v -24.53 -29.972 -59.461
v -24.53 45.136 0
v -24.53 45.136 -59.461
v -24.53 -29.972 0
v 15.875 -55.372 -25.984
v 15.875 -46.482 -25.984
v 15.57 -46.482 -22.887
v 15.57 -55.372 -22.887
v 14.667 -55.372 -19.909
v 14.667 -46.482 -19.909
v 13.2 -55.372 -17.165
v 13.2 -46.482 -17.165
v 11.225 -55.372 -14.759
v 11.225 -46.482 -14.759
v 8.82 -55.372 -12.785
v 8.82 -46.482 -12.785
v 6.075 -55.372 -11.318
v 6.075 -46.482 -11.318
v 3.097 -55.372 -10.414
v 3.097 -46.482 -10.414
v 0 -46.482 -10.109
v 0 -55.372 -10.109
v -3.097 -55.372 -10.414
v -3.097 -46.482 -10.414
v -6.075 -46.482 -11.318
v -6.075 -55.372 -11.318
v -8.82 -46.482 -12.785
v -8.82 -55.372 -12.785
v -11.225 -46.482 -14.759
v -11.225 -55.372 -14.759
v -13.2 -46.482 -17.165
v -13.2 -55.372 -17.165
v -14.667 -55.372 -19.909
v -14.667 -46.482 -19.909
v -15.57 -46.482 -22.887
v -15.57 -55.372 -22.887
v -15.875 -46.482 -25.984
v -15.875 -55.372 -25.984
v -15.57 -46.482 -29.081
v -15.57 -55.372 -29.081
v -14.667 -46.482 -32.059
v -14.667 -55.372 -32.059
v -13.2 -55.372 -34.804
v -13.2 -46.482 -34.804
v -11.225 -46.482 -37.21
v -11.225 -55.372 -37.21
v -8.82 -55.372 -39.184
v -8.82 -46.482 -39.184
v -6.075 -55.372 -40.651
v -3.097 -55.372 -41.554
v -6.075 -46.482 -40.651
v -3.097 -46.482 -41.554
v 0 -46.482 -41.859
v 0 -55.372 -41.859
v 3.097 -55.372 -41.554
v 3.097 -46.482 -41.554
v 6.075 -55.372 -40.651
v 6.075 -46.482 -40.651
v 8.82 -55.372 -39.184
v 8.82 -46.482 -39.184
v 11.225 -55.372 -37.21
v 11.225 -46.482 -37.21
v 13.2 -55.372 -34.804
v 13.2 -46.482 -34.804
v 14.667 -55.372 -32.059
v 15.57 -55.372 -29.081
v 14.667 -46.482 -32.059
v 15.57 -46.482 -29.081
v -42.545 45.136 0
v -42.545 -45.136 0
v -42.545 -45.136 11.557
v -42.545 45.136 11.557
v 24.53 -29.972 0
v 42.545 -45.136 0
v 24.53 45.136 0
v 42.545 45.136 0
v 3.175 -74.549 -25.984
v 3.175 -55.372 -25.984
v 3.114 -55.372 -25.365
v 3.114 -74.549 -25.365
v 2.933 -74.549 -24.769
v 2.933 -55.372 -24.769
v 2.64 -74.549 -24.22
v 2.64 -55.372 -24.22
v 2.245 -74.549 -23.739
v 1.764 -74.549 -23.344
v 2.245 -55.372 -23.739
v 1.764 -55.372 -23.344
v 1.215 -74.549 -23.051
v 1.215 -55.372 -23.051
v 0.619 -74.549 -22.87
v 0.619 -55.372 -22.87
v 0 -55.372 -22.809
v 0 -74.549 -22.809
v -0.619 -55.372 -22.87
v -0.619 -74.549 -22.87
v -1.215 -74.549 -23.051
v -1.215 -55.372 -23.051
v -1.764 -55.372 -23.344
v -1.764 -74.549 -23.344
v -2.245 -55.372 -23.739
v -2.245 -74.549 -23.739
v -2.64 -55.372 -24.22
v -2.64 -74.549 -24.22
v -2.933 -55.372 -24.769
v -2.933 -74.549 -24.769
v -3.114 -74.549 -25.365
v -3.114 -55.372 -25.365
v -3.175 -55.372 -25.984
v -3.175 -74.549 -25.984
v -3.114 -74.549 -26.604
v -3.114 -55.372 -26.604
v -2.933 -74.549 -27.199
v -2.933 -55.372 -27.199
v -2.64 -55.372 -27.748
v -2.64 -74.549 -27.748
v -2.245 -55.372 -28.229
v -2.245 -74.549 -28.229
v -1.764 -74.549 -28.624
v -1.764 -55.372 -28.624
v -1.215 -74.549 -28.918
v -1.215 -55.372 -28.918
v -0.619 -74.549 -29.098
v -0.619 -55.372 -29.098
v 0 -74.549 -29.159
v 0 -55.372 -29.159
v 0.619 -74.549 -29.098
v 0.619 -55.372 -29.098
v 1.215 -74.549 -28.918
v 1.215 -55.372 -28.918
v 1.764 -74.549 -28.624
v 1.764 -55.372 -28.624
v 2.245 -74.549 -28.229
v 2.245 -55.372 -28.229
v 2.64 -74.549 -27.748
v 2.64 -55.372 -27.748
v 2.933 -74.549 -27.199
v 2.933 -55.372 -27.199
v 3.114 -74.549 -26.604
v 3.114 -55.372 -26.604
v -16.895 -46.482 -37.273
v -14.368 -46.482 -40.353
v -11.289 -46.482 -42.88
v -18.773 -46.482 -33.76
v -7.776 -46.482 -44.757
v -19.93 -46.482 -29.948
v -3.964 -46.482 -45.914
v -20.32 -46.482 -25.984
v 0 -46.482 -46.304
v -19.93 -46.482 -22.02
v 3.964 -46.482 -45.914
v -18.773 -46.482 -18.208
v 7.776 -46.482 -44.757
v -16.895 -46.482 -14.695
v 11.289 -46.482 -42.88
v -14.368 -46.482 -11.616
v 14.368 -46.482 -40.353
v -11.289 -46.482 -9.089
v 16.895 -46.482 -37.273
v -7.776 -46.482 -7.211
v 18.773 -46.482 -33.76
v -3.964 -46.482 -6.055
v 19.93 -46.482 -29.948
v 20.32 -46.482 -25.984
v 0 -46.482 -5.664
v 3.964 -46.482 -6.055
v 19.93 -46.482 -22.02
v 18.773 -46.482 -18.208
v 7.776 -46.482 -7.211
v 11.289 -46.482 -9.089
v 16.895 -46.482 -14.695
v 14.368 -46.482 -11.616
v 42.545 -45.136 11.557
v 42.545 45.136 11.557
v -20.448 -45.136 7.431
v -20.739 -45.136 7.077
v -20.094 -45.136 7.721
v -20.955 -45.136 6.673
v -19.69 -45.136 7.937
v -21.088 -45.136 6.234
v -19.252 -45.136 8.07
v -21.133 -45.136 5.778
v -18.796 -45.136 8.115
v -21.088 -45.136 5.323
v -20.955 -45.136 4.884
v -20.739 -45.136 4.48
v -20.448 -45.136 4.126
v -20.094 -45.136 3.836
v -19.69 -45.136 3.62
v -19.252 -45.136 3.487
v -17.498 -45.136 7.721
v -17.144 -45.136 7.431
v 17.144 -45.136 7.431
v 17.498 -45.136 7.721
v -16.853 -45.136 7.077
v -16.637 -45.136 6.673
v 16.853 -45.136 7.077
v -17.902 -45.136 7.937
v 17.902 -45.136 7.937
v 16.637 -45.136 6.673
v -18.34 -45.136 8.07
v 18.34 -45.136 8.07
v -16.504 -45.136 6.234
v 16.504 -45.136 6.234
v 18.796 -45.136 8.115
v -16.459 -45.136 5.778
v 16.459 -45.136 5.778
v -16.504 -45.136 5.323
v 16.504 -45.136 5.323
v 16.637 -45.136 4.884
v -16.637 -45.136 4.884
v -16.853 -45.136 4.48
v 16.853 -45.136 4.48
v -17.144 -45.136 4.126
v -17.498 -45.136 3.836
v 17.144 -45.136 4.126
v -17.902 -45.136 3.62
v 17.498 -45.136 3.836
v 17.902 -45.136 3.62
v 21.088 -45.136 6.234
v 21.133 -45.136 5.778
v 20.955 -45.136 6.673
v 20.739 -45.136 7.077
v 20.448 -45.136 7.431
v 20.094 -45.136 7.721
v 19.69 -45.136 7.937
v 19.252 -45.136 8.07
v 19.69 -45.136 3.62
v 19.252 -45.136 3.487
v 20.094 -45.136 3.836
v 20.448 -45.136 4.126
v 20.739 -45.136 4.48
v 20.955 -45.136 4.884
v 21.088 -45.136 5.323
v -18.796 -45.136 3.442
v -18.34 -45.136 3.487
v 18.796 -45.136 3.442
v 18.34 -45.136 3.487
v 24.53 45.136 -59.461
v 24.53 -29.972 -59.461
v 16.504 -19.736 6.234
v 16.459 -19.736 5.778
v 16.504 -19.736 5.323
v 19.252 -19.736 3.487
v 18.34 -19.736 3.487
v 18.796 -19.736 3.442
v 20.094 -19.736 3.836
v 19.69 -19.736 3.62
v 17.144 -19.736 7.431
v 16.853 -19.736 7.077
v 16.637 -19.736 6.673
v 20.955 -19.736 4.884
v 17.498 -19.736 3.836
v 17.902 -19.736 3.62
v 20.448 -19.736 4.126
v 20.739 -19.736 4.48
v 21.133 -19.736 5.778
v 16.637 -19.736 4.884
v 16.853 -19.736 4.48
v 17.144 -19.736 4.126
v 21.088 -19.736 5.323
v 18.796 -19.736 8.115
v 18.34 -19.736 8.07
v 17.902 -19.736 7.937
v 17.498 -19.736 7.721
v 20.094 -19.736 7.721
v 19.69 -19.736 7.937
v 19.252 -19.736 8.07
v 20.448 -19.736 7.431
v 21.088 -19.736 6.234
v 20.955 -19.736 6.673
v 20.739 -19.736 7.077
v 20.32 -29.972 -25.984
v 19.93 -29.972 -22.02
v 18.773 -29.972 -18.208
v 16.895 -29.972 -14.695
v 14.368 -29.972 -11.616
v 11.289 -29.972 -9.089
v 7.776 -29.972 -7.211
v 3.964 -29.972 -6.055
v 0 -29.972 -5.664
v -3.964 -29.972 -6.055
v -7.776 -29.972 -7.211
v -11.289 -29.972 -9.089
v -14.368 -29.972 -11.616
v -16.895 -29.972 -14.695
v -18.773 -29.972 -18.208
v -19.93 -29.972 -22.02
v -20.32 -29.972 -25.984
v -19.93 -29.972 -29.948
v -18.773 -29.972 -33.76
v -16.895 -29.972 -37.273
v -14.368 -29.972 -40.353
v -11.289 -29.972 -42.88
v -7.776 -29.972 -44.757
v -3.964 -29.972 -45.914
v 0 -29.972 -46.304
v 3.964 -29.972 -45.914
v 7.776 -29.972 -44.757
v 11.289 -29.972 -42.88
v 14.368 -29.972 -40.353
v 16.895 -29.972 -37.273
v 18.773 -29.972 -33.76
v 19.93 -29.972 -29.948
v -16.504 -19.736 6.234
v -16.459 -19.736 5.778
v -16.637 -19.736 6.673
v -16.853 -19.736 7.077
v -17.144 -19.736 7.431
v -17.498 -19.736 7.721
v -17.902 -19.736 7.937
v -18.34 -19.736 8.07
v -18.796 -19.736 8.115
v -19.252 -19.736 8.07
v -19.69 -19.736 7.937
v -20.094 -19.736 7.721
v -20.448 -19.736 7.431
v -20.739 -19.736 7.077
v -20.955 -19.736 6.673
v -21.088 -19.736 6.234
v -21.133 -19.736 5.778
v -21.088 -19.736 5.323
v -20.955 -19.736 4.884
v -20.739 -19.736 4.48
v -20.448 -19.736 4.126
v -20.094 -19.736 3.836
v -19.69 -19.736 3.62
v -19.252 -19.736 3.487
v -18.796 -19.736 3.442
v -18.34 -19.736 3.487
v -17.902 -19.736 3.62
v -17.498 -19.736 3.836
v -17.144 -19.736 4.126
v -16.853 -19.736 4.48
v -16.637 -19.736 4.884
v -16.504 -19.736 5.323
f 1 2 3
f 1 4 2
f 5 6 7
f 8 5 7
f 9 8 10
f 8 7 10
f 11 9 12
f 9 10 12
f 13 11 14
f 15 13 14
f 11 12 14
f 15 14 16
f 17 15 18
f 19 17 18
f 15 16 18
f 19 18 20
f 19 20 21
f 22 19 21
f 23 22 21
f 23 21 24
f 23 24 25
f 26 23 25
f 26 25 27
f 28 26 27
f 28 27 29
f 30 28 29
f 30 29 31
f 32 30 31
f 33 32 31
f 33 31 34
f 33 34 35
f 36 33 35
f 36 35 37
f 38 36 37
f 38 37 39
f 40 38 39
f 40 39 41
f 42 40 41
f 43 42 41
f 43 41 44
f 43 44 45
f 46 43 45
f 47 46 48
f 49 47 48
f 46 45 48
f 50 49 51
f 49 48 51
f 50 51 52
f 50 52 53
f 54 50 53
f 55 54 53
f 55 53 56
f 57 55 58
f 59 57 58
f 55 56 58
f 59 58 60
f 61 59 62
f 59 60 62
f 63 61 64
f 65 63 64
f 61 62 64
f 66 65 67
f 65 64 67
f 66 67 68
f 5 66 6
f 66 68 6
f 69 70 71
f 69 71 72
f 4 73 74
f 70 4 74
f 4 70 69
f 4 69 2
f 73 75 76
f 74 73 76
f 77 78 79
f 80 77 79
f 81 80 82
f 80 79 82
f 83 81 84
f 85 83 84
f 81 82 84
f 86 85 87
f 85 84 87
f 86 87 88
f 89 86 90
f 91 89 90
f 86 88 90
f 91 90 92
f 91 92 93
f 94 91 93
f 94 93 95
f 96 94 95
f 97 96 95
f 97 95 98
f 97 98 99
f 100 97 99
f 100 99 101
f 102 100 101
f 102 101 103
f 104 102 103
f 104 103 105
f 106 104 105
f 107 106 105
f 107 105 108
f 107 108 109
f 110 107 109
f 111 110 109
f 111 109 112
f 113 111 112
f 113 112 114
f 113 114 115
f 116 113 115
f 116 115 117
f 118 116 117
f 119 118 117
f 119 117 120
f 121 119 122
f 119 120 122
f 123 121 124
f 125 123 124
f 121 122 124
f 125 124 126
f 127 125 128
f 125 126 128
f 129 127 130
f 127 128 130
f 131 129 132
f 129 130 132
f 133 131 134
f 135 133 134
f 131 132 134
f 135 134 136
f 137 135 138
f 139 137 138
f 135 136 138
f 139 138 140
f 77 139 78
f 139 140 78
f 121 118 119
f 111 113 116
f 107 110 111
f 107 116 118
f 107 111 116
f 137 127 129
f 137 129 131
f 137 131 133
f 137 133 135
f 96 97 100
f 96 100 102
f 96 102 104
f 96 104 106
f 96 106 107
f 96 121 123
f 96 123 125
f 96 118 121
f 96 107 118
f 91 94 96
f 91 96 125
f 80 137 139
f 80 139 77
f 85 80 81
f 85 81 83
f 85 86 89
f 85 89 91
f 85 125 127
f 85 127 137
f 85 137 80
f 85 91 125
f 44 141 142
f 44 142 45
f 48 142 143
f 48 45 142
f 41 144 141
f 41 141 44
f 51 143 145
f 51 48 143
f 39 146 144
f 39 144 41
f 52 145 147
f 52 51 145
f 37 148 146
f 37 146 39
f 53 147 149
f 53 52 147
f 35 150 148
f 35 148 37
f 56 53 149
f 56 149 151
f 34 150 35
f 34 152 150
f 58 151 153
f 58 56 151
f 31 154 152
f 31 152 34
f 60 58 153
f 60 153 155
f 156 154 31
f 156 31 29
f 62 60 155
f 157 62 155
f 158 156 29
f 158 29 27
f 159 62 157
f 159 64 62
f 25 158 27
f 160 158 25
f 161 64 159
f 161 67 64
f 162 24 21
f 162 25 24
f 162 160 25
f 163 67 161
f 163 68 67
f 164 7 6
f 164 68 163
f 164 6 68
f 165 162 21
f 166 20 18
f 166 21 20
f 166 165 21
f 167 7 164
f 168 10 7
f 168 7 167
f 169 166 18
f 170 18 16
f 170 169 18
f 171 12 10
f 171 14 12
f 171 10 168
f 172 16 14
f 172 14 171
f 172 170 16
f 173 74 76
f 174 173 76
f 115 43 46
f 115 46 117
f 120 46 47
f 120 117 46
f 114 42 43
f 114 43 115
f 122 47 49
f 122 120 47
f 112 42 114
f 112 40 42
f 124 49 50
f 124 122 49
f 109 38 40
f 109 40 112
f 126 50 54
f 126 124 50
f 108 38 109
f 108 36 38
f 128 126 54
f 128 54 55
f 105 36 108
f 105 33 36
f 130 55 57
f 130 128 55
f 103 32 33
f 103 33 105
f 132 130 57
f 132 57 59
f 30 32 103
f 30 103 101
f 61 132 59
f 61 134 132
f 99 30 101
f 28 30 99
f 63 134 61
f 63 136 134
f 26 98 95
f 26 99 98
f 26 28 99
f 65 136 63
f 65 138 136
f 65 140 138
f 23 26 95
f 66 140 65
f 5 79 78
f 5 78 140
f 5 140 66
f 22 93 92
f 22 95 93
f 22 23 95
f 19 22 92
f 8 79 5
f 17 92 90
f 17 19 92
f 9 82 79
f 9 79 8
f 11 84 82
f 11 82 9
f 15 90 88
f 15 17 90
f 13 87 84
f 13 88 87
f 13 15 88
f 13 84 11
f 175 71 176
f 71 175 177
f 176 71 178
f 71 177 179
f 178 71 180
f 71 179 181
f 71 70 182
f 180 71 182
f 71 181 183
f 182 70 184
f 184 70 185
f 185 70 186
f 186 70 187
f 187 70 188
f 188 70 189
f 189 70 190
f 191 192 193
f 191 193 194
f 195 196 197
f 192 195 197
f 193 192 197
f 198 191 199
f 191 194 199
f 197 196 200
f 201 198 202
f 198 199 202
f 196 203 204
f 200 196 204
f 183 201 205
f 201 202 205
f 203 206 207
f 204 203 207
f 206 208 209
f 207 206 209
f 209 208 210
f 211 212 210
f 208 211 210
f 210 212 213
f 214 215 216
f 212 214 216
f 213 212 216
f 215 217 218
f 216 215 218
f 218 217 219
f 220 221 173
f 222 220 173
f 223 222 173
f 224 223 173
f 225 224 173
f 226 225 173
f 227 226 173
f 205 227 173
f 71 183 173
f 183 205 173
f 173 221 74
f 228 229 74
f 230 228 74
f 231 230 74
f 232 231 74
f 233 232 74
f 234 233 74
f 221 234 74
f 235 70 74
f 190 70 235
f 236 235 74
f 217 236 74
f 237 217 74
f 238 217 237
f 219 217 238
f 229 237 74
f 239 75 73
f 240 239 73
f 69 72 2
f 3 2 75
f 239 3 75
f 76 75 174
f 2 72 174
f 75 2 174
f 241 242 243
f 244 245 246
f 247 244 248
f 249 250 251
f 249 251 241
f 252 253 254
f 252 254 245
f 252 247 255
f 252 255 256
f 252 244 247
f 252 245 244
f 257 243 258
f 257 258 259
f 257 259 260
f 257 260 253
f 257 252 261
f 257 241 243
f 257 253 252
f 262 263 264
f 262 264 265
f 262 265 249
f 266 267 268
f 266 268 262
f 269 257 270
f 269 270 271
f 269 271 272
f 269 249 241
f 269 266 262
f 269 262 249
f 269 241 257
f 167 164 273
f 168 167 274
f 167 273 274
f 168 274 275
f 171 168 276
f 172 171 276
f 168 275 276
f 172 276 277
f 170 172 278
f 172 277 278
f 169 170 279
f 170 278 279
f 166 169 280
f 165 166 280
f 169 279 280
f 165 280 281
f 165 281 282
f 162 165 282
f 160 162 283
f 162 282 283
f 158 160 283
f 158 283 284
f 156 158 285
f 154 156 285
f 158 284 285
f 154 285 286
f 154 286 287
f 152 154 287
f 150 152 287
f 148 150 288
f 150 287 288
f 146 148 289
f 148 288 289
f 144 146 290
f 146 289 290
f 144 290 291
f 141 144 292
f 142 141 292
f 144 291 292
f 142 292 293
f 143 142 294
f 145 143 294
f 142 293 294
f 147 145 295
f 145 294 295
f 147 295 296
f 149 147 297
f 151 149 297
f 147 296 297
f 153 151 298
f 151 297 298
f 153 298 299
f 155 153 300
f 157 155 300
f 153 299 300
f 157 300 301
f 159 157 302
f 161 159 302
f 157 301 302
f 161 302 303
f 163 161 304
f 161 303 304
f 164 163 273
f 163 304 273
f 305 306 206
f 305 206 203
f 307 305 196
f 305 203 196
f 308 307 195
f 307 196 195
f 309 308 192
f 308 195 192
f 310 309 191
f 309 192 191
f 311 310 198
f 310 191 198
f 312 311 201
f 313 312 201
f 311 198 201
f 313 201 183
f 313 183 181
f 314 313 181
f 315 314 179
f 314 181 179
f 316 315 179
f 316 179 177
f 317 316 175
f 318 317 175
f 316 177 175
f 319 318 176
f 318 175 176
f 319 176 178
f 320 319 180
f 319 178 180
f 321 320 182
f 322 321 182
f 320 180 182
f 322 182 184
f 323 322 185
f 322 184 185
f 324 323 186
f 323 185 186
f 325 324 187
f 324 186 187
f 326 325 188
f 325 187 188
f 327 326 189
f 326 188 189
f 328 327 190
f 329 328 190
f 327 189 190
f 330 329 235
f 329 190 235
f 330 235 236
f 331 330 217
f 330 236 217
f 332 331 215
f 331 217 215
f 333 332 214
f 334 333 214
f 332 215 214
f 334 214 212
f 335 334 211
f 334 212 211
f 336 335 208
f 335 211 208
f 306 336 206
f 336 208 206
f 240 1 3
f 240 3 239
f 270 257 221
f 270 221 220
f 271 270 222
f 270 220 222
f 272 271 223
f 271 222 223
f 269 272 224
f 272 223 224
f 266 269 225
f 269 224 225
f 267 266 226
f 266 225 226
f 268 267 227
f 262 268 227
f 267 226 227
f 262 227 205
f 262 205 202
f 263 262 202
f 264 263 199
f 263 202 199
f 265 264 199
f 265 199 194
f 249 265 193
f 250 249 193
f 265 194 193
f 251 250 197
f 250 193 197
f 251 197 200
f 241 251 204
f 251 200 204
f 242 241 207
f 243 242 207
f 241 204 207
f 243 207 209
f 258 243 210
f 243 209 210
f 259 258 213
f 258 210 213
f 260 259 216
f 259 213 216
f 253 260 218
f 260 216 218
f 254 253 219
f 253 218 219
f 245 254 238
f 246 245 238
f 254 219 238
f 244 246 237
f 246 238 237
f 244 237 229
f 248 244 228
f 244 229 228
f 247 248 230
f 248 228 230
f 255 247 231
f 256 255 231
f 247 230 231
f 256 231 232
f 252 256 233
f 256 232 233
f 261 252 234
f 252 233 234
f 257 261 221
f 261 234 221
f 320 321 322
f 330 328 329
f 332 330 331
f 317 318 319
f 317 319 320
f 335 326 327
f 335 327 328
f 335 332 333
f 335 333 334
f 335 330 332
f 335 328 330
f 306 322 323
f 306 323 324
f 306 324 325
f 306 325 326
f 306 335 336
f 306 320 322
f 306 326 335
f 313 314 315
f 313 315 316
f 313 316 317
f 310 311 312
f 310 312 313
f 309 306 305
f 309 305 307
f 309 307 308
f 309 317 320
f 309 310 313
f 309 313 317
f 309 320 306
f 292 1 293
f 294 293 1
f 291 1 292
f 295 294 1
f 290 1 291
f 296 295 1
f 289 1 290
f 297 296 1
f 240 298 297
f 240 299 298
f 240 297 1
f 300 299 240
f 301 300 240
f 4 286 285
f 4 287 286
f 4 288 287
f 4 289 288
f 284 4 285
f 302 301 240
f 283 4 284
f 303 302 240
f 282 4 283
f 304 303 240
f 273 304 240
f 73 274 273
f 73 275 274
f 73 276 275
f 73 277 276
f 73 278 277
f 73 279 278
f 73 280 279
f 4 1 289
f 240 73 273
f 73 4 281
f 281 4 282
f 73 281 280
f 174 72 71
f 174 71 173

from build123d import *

# Parameters (mm, degrees)
F0_W      = 85.09
F0_H      = 90.2716
F1_DEPTH  = 11.557
F2_W      = 49.060036246
F2_H      = 59.944
F3_DEPTH  = 59.4614
F4_R      = 20.32
F4_R_2    = 15.875
F5_DEPTH  = 16.51
F4_R_3    = 3.175
F6_DEPTH  = 25.4
F7_DEPTH  = 44.577
F8_R      = 2.3368
F9_DEPTH  = 25.4
F10_DEPTH = 15.1638


with BuildPart() as f1:
    # F0 (on Top) → F1 (new body)
    with BuildSketch(Plane.XY):
        Rectangle(F0_W, F0_H)
    extrude(amount=F1_DEPTH)

    # F2 (on face) → F3 (join)
    with BuildSketch(Plane(origin=(0, 0, 0), x_dir=(1, 0, 0), z_dir=(0, 0, -1))):
        Rectangle(F2_W, F2_H)
    extrude(amount=F3_DEPTH)

    # F4 (on face) → F5 (join)
    with BuildSketch(Plane.XZ.offset(29.972)):
        with Locations((0, -25.9842)):
            Circle(F4_R)
        with Locations((0, -25.9842)):
            Circle(F4_R_2, mode=Mode.SUBTRACT)
    extrude(amount=F5_DEPTH)

    # F4 (on face) → F6 (join)
    with BuildSketch(Plane.XZ.offset(29.972)):
        with Locations((0, -25.9842)):
            Circle(F4_R_2)
        with Locations((0, -25.9842)):
            Circle(F4_R_3, mode=Mode.SUBTRACT)
    extrude(amount=F6_DEPTH)

    # F4 (on face) → F7 (join)
    with BuildSketch(Plane.XZ.offset(29.972)):
        with Locations((0, -25.9842)):
            Circle(F4_R_3)
    extrude(amount=F7_DEPTH)

    # F8 (on face) → F9 (cut)
    with BuildSketch(Plane.XZ.offset(45.1358)):
        with Locations((-18.796, 5.7785)):
            Circle(F8_R)
        with Locations((18.796, 5.7785)):
            Circle(F8_R)
    extrude(amount=-F9_DEPTH, mode=Mode.SUBTRACT)

    # F10 (add, through all): a face of the model
    f10_faces = [f1.faces().sort_by_distance(p)[0] for p in [
        (0, 29.972, -29.7307),
    ]]
    extrude(f10_faces, amount=F10_DEPTH)


solid = f1.part
